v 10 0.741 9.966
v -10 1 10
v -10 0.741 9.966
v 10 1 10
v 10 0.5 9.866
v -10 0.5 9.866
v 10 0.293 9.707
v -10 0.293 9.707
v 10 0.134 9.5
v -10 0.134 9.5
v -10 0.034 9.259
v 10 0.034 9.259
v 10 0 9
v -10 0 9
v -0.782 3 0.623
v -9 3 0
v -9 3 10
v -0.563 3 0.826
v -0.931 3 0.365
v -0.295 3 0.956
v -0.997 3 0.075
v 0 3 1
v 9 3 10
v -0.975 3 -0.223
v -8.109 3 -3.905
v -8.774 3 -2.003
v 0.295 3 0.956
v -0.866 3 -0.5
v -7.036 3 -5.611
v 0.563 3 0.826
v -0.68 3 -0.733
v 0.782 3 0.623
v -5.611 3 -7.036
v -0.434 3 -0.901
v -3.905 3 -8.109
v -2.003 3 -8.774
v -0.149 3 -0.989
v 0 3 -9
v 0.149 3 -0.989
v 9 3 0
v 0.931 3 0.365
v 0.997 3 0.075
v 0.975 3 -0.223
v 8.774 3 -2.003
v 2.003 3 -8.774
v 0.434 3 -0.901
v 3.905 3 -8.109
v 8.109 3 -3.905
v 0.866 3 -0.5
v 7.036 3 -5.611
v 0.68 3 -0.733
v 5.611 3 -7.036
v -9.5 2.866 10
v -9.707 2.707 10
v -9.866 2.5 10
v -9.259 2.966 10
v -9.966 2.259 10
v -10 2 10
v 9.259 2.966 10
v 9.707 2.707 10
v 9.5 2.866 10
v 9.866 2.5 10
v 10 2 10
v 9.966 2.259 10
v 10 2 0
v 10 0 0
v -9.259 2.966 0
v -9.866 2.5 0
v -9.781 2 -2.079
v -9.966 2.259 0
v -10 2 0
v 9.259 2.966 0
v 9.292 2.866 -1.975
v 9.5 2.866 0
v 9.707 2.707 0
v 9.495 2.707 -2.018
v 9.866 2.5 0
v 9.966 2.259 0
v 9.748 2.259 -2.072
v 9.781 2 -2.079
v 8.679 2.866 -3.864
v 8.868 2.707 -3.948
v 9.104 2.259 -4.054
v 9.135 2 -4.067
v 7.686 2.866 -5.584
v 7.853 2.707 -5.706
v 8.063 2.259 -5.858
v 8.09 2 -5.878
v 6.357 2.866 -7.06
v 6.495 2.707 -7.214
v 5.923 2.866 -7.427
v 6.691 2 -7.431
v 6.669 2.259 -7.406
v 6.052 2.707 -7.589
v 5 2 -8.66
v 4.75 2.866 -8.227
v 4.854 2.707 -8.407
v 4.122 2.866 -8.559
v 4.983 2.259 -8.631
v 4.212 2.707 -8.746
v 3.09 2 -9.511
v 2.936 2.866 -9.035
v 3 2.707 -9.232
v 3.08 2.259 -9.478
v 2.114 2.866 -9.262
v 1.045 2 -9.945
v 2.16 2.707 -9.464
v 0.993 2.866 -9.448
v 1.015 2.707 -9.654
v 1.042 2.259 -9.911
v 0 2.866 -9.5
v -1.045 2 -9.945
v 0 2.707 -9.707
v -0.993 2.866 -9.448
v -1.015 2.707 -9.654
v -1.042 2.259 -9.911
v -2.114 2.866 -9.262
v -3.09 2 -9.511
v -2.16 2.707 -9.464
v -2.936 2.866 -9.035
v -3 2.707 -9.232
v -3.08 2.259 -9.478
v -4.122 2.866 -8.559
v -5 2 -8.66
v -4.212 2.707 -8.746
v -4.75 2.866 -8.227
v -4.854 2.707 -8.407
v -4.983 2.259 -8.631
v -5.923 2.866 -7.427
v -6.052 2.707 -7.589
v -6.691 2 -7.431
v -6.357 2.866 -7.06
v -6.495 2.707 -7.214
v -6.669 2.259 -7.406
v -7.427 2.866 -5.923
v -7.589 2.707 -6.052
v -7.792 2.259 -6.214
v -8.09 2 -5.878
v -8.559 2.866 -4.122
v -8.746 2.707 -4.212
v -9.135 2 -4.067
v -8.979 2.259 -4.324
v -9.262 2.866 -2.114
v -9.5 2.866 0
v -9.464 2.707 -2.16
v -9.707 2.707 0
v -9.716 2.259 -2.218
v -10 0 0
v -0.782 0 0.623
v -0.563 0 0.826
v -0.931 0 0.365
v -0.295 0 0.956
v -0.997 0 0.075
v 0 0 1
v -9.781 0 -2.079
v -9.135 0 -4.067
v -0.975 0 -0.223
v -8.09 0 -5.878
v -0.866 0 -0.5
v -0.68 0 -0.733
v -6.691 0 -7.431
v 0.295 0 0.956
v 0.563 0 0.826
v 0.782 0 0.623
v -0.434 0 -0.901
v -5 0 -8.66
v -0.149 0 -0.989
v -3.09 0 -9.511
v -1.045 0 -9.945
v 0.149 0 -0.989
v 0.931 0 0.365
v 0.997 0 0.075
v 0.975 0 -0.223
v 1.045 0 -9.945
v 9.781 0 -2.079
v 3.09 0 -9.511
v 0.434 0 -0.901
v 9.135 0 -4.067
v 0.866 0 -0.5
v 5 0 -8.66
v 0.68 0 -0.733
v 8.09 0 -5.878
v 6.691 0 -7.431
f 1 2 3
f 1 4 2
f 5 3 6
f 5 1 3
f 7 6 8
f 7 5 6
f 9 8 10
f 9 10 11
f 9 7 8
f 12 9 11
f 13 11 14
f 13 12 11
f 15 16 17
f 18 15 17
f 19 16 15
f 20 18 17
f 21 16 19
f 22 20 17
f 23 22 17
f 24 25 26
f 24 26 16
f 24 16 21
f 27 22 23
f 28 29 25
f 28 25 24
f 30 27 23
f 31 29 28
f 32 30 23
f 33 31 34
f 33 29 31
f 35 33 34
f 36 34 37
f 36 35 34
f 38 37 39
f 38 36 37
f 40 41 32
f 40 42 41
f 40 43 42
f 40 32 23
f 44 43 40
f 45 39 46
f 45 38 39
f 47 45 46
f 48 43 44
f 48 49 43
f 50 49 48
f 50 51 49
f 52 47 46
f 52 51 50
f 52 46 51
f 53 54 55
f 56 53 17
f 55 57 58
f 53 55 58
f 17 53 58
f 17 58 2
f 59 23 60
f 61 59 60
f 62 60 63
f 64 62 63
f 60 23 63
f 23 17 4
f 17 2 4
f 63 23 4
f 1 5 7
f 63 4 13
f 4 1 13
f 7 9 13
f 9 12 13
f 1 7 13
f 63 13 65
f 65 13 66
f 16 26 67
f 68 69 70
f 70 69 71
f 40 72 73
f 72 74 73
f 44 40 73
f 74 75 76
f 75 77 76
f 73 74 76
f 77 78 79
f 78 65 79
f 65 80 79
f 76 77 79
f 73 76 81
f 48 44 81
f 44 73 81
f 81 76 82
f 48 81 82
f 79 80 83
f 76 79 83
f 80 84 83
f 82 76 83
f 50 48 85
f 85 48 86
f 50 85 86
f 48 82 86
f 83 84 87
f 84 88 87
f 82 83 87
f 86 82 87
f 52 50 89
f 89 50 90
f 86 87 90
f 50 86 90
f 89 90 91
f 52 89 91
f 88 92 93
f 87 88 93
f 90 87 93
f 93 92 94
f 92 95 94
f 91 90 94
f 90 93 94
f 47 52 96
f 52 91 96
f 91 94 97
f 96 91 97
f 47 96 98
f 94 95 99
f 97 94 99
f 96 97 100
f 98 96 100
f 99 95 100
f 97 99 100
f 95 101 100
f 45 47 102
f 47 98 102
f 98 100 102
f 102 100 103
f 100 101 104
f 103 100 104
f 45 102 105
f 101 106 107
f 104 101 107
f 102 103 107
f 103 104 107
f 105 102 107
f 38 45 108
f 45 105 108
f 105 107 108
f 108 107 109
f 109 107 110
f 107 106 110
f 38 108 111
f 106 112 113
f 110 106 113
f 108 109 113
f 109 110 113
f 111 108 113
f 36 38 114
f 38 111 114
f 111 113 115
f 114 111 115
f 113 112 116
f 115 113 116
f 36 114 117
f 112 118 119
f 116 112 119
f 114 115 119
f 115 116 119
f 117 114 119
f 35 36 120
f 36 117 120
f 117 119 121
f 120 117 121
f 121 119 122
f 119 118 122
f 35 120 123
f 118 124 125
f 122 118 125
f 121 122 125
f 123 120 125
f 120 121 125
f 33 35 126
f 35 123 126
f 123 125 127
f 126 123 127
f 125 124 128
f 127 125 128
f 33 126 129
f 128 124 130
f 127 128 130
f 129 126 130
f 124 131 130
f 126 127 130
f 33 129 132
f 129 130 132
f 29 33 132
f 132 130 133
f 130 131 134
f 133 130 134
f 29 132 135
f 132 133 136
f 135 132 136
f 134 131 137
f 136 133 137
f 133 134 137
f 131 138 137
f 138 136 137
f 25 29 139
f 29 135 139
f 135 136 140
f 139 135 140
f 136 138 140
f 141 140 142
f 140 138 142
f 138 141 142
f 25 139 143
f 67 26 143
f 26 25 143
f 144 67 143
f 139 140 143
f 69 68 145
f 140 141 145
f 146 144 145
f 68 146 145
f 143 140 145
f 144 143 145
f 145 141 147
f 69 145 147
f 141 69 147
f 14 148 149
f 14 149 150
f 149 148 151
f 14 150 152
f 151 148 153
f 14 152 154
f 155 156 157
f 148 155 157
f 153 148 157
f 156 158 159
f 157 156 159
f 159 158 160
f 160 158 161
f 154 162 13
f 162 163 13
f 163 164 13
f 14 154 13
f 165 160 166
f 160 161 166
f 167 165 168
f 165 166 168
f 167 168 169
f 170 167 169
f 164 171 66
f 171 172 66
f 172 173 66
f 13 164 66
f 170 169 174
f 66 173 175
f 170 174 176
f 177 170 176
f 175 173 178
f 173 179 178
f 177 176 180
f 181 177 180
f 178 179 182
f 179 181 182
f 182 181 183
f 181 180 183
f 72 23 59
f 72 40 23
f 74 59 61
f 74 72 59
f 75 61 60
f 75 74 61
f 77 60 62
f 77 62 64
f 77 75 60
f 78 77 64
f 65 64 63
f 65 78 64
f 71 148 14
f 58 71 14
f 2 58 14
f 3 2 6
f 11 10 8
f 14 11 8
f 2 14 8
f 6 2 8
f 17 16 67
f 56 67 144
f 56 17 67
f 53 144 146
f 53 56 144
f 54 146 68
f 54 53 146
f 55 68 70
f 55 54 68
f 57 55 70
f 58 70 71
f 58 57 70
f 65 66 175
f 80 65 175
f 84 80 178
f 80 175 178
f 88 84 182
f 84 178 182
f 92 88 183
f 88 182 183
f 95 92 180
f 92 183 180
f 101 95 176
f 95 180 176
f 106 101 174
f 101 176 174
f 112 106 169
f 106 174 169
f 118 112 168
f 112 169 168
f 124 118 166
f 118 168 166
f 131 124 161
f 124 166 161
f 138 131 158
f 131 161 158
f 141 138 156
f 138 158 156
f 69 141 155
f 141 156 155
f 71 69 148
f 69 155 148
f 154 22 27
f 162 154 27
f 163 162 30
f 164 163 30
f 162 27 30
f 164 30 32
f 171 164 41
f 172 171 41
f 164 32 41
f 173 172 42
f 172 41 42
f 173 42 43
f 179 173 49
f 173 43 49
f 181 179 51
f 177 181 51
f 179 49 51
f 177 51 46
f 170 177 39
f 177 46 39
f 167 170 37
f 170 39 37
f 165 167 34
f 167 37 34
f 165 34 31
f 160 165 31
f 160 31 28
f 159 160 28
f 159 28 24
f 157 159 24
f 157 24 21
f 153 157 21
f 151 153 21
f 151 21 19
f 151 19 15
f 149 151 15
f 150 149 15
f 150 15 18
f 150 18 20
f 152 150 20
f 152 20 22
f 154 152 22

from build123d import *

# Parameters (mm, degrees)
BOSS_EXTRUDE1_DEPTH = 3
SKETCH2_R           = 1
CUT_EXTRUDE1_DEPTH  = 15.456832295
FILLET1_R           = 1


with BuildPart() as part:
    # Sketch1 → Boss-Extrude1 (new body)
    with BuildSketch(Plane(origin=(0, 0, 0), x_dir=(1, 0, 0), z_dir=(0, 1, 0))):
        with BuildLine():
            Line((-10, 0), (-10, -10))
            Line((-10, -10), (10, -10))
            Line((10, -10), (10, 0))
            ThreePointArc((10, 0), (0, 10), (-10, 0))
        make_face()
    extrude(amount=BOSS_EXTRUDE1_DEPTH)

    # Sketch2 → Cut-Extrude1 (cut, through all)
    with BuildSketch(Plane(origin=(0, 3, 0), x_dir=(1, 0, 0), z_dir=(0, 1, 0))):
        with Locations(Location((0, 0, 0), (0, 0, 270))):
            Circle(SKETCH2_R)
    extrude(amount=-CUT_EXTRUDE1_DEPTH, mode=Mode.SUBTRACT)

    # Fillet1
    fillet1_edges = [part.edges().sort_by_distance(p)[0] for p in [
        (10, 3, 5),
        (0, 3, -10),
        (0, 0, 10),
        (-10, 3, 5),
    ]]
    fillet(fillet1_edges, radius=FILLET1_R)


solid = part.part
